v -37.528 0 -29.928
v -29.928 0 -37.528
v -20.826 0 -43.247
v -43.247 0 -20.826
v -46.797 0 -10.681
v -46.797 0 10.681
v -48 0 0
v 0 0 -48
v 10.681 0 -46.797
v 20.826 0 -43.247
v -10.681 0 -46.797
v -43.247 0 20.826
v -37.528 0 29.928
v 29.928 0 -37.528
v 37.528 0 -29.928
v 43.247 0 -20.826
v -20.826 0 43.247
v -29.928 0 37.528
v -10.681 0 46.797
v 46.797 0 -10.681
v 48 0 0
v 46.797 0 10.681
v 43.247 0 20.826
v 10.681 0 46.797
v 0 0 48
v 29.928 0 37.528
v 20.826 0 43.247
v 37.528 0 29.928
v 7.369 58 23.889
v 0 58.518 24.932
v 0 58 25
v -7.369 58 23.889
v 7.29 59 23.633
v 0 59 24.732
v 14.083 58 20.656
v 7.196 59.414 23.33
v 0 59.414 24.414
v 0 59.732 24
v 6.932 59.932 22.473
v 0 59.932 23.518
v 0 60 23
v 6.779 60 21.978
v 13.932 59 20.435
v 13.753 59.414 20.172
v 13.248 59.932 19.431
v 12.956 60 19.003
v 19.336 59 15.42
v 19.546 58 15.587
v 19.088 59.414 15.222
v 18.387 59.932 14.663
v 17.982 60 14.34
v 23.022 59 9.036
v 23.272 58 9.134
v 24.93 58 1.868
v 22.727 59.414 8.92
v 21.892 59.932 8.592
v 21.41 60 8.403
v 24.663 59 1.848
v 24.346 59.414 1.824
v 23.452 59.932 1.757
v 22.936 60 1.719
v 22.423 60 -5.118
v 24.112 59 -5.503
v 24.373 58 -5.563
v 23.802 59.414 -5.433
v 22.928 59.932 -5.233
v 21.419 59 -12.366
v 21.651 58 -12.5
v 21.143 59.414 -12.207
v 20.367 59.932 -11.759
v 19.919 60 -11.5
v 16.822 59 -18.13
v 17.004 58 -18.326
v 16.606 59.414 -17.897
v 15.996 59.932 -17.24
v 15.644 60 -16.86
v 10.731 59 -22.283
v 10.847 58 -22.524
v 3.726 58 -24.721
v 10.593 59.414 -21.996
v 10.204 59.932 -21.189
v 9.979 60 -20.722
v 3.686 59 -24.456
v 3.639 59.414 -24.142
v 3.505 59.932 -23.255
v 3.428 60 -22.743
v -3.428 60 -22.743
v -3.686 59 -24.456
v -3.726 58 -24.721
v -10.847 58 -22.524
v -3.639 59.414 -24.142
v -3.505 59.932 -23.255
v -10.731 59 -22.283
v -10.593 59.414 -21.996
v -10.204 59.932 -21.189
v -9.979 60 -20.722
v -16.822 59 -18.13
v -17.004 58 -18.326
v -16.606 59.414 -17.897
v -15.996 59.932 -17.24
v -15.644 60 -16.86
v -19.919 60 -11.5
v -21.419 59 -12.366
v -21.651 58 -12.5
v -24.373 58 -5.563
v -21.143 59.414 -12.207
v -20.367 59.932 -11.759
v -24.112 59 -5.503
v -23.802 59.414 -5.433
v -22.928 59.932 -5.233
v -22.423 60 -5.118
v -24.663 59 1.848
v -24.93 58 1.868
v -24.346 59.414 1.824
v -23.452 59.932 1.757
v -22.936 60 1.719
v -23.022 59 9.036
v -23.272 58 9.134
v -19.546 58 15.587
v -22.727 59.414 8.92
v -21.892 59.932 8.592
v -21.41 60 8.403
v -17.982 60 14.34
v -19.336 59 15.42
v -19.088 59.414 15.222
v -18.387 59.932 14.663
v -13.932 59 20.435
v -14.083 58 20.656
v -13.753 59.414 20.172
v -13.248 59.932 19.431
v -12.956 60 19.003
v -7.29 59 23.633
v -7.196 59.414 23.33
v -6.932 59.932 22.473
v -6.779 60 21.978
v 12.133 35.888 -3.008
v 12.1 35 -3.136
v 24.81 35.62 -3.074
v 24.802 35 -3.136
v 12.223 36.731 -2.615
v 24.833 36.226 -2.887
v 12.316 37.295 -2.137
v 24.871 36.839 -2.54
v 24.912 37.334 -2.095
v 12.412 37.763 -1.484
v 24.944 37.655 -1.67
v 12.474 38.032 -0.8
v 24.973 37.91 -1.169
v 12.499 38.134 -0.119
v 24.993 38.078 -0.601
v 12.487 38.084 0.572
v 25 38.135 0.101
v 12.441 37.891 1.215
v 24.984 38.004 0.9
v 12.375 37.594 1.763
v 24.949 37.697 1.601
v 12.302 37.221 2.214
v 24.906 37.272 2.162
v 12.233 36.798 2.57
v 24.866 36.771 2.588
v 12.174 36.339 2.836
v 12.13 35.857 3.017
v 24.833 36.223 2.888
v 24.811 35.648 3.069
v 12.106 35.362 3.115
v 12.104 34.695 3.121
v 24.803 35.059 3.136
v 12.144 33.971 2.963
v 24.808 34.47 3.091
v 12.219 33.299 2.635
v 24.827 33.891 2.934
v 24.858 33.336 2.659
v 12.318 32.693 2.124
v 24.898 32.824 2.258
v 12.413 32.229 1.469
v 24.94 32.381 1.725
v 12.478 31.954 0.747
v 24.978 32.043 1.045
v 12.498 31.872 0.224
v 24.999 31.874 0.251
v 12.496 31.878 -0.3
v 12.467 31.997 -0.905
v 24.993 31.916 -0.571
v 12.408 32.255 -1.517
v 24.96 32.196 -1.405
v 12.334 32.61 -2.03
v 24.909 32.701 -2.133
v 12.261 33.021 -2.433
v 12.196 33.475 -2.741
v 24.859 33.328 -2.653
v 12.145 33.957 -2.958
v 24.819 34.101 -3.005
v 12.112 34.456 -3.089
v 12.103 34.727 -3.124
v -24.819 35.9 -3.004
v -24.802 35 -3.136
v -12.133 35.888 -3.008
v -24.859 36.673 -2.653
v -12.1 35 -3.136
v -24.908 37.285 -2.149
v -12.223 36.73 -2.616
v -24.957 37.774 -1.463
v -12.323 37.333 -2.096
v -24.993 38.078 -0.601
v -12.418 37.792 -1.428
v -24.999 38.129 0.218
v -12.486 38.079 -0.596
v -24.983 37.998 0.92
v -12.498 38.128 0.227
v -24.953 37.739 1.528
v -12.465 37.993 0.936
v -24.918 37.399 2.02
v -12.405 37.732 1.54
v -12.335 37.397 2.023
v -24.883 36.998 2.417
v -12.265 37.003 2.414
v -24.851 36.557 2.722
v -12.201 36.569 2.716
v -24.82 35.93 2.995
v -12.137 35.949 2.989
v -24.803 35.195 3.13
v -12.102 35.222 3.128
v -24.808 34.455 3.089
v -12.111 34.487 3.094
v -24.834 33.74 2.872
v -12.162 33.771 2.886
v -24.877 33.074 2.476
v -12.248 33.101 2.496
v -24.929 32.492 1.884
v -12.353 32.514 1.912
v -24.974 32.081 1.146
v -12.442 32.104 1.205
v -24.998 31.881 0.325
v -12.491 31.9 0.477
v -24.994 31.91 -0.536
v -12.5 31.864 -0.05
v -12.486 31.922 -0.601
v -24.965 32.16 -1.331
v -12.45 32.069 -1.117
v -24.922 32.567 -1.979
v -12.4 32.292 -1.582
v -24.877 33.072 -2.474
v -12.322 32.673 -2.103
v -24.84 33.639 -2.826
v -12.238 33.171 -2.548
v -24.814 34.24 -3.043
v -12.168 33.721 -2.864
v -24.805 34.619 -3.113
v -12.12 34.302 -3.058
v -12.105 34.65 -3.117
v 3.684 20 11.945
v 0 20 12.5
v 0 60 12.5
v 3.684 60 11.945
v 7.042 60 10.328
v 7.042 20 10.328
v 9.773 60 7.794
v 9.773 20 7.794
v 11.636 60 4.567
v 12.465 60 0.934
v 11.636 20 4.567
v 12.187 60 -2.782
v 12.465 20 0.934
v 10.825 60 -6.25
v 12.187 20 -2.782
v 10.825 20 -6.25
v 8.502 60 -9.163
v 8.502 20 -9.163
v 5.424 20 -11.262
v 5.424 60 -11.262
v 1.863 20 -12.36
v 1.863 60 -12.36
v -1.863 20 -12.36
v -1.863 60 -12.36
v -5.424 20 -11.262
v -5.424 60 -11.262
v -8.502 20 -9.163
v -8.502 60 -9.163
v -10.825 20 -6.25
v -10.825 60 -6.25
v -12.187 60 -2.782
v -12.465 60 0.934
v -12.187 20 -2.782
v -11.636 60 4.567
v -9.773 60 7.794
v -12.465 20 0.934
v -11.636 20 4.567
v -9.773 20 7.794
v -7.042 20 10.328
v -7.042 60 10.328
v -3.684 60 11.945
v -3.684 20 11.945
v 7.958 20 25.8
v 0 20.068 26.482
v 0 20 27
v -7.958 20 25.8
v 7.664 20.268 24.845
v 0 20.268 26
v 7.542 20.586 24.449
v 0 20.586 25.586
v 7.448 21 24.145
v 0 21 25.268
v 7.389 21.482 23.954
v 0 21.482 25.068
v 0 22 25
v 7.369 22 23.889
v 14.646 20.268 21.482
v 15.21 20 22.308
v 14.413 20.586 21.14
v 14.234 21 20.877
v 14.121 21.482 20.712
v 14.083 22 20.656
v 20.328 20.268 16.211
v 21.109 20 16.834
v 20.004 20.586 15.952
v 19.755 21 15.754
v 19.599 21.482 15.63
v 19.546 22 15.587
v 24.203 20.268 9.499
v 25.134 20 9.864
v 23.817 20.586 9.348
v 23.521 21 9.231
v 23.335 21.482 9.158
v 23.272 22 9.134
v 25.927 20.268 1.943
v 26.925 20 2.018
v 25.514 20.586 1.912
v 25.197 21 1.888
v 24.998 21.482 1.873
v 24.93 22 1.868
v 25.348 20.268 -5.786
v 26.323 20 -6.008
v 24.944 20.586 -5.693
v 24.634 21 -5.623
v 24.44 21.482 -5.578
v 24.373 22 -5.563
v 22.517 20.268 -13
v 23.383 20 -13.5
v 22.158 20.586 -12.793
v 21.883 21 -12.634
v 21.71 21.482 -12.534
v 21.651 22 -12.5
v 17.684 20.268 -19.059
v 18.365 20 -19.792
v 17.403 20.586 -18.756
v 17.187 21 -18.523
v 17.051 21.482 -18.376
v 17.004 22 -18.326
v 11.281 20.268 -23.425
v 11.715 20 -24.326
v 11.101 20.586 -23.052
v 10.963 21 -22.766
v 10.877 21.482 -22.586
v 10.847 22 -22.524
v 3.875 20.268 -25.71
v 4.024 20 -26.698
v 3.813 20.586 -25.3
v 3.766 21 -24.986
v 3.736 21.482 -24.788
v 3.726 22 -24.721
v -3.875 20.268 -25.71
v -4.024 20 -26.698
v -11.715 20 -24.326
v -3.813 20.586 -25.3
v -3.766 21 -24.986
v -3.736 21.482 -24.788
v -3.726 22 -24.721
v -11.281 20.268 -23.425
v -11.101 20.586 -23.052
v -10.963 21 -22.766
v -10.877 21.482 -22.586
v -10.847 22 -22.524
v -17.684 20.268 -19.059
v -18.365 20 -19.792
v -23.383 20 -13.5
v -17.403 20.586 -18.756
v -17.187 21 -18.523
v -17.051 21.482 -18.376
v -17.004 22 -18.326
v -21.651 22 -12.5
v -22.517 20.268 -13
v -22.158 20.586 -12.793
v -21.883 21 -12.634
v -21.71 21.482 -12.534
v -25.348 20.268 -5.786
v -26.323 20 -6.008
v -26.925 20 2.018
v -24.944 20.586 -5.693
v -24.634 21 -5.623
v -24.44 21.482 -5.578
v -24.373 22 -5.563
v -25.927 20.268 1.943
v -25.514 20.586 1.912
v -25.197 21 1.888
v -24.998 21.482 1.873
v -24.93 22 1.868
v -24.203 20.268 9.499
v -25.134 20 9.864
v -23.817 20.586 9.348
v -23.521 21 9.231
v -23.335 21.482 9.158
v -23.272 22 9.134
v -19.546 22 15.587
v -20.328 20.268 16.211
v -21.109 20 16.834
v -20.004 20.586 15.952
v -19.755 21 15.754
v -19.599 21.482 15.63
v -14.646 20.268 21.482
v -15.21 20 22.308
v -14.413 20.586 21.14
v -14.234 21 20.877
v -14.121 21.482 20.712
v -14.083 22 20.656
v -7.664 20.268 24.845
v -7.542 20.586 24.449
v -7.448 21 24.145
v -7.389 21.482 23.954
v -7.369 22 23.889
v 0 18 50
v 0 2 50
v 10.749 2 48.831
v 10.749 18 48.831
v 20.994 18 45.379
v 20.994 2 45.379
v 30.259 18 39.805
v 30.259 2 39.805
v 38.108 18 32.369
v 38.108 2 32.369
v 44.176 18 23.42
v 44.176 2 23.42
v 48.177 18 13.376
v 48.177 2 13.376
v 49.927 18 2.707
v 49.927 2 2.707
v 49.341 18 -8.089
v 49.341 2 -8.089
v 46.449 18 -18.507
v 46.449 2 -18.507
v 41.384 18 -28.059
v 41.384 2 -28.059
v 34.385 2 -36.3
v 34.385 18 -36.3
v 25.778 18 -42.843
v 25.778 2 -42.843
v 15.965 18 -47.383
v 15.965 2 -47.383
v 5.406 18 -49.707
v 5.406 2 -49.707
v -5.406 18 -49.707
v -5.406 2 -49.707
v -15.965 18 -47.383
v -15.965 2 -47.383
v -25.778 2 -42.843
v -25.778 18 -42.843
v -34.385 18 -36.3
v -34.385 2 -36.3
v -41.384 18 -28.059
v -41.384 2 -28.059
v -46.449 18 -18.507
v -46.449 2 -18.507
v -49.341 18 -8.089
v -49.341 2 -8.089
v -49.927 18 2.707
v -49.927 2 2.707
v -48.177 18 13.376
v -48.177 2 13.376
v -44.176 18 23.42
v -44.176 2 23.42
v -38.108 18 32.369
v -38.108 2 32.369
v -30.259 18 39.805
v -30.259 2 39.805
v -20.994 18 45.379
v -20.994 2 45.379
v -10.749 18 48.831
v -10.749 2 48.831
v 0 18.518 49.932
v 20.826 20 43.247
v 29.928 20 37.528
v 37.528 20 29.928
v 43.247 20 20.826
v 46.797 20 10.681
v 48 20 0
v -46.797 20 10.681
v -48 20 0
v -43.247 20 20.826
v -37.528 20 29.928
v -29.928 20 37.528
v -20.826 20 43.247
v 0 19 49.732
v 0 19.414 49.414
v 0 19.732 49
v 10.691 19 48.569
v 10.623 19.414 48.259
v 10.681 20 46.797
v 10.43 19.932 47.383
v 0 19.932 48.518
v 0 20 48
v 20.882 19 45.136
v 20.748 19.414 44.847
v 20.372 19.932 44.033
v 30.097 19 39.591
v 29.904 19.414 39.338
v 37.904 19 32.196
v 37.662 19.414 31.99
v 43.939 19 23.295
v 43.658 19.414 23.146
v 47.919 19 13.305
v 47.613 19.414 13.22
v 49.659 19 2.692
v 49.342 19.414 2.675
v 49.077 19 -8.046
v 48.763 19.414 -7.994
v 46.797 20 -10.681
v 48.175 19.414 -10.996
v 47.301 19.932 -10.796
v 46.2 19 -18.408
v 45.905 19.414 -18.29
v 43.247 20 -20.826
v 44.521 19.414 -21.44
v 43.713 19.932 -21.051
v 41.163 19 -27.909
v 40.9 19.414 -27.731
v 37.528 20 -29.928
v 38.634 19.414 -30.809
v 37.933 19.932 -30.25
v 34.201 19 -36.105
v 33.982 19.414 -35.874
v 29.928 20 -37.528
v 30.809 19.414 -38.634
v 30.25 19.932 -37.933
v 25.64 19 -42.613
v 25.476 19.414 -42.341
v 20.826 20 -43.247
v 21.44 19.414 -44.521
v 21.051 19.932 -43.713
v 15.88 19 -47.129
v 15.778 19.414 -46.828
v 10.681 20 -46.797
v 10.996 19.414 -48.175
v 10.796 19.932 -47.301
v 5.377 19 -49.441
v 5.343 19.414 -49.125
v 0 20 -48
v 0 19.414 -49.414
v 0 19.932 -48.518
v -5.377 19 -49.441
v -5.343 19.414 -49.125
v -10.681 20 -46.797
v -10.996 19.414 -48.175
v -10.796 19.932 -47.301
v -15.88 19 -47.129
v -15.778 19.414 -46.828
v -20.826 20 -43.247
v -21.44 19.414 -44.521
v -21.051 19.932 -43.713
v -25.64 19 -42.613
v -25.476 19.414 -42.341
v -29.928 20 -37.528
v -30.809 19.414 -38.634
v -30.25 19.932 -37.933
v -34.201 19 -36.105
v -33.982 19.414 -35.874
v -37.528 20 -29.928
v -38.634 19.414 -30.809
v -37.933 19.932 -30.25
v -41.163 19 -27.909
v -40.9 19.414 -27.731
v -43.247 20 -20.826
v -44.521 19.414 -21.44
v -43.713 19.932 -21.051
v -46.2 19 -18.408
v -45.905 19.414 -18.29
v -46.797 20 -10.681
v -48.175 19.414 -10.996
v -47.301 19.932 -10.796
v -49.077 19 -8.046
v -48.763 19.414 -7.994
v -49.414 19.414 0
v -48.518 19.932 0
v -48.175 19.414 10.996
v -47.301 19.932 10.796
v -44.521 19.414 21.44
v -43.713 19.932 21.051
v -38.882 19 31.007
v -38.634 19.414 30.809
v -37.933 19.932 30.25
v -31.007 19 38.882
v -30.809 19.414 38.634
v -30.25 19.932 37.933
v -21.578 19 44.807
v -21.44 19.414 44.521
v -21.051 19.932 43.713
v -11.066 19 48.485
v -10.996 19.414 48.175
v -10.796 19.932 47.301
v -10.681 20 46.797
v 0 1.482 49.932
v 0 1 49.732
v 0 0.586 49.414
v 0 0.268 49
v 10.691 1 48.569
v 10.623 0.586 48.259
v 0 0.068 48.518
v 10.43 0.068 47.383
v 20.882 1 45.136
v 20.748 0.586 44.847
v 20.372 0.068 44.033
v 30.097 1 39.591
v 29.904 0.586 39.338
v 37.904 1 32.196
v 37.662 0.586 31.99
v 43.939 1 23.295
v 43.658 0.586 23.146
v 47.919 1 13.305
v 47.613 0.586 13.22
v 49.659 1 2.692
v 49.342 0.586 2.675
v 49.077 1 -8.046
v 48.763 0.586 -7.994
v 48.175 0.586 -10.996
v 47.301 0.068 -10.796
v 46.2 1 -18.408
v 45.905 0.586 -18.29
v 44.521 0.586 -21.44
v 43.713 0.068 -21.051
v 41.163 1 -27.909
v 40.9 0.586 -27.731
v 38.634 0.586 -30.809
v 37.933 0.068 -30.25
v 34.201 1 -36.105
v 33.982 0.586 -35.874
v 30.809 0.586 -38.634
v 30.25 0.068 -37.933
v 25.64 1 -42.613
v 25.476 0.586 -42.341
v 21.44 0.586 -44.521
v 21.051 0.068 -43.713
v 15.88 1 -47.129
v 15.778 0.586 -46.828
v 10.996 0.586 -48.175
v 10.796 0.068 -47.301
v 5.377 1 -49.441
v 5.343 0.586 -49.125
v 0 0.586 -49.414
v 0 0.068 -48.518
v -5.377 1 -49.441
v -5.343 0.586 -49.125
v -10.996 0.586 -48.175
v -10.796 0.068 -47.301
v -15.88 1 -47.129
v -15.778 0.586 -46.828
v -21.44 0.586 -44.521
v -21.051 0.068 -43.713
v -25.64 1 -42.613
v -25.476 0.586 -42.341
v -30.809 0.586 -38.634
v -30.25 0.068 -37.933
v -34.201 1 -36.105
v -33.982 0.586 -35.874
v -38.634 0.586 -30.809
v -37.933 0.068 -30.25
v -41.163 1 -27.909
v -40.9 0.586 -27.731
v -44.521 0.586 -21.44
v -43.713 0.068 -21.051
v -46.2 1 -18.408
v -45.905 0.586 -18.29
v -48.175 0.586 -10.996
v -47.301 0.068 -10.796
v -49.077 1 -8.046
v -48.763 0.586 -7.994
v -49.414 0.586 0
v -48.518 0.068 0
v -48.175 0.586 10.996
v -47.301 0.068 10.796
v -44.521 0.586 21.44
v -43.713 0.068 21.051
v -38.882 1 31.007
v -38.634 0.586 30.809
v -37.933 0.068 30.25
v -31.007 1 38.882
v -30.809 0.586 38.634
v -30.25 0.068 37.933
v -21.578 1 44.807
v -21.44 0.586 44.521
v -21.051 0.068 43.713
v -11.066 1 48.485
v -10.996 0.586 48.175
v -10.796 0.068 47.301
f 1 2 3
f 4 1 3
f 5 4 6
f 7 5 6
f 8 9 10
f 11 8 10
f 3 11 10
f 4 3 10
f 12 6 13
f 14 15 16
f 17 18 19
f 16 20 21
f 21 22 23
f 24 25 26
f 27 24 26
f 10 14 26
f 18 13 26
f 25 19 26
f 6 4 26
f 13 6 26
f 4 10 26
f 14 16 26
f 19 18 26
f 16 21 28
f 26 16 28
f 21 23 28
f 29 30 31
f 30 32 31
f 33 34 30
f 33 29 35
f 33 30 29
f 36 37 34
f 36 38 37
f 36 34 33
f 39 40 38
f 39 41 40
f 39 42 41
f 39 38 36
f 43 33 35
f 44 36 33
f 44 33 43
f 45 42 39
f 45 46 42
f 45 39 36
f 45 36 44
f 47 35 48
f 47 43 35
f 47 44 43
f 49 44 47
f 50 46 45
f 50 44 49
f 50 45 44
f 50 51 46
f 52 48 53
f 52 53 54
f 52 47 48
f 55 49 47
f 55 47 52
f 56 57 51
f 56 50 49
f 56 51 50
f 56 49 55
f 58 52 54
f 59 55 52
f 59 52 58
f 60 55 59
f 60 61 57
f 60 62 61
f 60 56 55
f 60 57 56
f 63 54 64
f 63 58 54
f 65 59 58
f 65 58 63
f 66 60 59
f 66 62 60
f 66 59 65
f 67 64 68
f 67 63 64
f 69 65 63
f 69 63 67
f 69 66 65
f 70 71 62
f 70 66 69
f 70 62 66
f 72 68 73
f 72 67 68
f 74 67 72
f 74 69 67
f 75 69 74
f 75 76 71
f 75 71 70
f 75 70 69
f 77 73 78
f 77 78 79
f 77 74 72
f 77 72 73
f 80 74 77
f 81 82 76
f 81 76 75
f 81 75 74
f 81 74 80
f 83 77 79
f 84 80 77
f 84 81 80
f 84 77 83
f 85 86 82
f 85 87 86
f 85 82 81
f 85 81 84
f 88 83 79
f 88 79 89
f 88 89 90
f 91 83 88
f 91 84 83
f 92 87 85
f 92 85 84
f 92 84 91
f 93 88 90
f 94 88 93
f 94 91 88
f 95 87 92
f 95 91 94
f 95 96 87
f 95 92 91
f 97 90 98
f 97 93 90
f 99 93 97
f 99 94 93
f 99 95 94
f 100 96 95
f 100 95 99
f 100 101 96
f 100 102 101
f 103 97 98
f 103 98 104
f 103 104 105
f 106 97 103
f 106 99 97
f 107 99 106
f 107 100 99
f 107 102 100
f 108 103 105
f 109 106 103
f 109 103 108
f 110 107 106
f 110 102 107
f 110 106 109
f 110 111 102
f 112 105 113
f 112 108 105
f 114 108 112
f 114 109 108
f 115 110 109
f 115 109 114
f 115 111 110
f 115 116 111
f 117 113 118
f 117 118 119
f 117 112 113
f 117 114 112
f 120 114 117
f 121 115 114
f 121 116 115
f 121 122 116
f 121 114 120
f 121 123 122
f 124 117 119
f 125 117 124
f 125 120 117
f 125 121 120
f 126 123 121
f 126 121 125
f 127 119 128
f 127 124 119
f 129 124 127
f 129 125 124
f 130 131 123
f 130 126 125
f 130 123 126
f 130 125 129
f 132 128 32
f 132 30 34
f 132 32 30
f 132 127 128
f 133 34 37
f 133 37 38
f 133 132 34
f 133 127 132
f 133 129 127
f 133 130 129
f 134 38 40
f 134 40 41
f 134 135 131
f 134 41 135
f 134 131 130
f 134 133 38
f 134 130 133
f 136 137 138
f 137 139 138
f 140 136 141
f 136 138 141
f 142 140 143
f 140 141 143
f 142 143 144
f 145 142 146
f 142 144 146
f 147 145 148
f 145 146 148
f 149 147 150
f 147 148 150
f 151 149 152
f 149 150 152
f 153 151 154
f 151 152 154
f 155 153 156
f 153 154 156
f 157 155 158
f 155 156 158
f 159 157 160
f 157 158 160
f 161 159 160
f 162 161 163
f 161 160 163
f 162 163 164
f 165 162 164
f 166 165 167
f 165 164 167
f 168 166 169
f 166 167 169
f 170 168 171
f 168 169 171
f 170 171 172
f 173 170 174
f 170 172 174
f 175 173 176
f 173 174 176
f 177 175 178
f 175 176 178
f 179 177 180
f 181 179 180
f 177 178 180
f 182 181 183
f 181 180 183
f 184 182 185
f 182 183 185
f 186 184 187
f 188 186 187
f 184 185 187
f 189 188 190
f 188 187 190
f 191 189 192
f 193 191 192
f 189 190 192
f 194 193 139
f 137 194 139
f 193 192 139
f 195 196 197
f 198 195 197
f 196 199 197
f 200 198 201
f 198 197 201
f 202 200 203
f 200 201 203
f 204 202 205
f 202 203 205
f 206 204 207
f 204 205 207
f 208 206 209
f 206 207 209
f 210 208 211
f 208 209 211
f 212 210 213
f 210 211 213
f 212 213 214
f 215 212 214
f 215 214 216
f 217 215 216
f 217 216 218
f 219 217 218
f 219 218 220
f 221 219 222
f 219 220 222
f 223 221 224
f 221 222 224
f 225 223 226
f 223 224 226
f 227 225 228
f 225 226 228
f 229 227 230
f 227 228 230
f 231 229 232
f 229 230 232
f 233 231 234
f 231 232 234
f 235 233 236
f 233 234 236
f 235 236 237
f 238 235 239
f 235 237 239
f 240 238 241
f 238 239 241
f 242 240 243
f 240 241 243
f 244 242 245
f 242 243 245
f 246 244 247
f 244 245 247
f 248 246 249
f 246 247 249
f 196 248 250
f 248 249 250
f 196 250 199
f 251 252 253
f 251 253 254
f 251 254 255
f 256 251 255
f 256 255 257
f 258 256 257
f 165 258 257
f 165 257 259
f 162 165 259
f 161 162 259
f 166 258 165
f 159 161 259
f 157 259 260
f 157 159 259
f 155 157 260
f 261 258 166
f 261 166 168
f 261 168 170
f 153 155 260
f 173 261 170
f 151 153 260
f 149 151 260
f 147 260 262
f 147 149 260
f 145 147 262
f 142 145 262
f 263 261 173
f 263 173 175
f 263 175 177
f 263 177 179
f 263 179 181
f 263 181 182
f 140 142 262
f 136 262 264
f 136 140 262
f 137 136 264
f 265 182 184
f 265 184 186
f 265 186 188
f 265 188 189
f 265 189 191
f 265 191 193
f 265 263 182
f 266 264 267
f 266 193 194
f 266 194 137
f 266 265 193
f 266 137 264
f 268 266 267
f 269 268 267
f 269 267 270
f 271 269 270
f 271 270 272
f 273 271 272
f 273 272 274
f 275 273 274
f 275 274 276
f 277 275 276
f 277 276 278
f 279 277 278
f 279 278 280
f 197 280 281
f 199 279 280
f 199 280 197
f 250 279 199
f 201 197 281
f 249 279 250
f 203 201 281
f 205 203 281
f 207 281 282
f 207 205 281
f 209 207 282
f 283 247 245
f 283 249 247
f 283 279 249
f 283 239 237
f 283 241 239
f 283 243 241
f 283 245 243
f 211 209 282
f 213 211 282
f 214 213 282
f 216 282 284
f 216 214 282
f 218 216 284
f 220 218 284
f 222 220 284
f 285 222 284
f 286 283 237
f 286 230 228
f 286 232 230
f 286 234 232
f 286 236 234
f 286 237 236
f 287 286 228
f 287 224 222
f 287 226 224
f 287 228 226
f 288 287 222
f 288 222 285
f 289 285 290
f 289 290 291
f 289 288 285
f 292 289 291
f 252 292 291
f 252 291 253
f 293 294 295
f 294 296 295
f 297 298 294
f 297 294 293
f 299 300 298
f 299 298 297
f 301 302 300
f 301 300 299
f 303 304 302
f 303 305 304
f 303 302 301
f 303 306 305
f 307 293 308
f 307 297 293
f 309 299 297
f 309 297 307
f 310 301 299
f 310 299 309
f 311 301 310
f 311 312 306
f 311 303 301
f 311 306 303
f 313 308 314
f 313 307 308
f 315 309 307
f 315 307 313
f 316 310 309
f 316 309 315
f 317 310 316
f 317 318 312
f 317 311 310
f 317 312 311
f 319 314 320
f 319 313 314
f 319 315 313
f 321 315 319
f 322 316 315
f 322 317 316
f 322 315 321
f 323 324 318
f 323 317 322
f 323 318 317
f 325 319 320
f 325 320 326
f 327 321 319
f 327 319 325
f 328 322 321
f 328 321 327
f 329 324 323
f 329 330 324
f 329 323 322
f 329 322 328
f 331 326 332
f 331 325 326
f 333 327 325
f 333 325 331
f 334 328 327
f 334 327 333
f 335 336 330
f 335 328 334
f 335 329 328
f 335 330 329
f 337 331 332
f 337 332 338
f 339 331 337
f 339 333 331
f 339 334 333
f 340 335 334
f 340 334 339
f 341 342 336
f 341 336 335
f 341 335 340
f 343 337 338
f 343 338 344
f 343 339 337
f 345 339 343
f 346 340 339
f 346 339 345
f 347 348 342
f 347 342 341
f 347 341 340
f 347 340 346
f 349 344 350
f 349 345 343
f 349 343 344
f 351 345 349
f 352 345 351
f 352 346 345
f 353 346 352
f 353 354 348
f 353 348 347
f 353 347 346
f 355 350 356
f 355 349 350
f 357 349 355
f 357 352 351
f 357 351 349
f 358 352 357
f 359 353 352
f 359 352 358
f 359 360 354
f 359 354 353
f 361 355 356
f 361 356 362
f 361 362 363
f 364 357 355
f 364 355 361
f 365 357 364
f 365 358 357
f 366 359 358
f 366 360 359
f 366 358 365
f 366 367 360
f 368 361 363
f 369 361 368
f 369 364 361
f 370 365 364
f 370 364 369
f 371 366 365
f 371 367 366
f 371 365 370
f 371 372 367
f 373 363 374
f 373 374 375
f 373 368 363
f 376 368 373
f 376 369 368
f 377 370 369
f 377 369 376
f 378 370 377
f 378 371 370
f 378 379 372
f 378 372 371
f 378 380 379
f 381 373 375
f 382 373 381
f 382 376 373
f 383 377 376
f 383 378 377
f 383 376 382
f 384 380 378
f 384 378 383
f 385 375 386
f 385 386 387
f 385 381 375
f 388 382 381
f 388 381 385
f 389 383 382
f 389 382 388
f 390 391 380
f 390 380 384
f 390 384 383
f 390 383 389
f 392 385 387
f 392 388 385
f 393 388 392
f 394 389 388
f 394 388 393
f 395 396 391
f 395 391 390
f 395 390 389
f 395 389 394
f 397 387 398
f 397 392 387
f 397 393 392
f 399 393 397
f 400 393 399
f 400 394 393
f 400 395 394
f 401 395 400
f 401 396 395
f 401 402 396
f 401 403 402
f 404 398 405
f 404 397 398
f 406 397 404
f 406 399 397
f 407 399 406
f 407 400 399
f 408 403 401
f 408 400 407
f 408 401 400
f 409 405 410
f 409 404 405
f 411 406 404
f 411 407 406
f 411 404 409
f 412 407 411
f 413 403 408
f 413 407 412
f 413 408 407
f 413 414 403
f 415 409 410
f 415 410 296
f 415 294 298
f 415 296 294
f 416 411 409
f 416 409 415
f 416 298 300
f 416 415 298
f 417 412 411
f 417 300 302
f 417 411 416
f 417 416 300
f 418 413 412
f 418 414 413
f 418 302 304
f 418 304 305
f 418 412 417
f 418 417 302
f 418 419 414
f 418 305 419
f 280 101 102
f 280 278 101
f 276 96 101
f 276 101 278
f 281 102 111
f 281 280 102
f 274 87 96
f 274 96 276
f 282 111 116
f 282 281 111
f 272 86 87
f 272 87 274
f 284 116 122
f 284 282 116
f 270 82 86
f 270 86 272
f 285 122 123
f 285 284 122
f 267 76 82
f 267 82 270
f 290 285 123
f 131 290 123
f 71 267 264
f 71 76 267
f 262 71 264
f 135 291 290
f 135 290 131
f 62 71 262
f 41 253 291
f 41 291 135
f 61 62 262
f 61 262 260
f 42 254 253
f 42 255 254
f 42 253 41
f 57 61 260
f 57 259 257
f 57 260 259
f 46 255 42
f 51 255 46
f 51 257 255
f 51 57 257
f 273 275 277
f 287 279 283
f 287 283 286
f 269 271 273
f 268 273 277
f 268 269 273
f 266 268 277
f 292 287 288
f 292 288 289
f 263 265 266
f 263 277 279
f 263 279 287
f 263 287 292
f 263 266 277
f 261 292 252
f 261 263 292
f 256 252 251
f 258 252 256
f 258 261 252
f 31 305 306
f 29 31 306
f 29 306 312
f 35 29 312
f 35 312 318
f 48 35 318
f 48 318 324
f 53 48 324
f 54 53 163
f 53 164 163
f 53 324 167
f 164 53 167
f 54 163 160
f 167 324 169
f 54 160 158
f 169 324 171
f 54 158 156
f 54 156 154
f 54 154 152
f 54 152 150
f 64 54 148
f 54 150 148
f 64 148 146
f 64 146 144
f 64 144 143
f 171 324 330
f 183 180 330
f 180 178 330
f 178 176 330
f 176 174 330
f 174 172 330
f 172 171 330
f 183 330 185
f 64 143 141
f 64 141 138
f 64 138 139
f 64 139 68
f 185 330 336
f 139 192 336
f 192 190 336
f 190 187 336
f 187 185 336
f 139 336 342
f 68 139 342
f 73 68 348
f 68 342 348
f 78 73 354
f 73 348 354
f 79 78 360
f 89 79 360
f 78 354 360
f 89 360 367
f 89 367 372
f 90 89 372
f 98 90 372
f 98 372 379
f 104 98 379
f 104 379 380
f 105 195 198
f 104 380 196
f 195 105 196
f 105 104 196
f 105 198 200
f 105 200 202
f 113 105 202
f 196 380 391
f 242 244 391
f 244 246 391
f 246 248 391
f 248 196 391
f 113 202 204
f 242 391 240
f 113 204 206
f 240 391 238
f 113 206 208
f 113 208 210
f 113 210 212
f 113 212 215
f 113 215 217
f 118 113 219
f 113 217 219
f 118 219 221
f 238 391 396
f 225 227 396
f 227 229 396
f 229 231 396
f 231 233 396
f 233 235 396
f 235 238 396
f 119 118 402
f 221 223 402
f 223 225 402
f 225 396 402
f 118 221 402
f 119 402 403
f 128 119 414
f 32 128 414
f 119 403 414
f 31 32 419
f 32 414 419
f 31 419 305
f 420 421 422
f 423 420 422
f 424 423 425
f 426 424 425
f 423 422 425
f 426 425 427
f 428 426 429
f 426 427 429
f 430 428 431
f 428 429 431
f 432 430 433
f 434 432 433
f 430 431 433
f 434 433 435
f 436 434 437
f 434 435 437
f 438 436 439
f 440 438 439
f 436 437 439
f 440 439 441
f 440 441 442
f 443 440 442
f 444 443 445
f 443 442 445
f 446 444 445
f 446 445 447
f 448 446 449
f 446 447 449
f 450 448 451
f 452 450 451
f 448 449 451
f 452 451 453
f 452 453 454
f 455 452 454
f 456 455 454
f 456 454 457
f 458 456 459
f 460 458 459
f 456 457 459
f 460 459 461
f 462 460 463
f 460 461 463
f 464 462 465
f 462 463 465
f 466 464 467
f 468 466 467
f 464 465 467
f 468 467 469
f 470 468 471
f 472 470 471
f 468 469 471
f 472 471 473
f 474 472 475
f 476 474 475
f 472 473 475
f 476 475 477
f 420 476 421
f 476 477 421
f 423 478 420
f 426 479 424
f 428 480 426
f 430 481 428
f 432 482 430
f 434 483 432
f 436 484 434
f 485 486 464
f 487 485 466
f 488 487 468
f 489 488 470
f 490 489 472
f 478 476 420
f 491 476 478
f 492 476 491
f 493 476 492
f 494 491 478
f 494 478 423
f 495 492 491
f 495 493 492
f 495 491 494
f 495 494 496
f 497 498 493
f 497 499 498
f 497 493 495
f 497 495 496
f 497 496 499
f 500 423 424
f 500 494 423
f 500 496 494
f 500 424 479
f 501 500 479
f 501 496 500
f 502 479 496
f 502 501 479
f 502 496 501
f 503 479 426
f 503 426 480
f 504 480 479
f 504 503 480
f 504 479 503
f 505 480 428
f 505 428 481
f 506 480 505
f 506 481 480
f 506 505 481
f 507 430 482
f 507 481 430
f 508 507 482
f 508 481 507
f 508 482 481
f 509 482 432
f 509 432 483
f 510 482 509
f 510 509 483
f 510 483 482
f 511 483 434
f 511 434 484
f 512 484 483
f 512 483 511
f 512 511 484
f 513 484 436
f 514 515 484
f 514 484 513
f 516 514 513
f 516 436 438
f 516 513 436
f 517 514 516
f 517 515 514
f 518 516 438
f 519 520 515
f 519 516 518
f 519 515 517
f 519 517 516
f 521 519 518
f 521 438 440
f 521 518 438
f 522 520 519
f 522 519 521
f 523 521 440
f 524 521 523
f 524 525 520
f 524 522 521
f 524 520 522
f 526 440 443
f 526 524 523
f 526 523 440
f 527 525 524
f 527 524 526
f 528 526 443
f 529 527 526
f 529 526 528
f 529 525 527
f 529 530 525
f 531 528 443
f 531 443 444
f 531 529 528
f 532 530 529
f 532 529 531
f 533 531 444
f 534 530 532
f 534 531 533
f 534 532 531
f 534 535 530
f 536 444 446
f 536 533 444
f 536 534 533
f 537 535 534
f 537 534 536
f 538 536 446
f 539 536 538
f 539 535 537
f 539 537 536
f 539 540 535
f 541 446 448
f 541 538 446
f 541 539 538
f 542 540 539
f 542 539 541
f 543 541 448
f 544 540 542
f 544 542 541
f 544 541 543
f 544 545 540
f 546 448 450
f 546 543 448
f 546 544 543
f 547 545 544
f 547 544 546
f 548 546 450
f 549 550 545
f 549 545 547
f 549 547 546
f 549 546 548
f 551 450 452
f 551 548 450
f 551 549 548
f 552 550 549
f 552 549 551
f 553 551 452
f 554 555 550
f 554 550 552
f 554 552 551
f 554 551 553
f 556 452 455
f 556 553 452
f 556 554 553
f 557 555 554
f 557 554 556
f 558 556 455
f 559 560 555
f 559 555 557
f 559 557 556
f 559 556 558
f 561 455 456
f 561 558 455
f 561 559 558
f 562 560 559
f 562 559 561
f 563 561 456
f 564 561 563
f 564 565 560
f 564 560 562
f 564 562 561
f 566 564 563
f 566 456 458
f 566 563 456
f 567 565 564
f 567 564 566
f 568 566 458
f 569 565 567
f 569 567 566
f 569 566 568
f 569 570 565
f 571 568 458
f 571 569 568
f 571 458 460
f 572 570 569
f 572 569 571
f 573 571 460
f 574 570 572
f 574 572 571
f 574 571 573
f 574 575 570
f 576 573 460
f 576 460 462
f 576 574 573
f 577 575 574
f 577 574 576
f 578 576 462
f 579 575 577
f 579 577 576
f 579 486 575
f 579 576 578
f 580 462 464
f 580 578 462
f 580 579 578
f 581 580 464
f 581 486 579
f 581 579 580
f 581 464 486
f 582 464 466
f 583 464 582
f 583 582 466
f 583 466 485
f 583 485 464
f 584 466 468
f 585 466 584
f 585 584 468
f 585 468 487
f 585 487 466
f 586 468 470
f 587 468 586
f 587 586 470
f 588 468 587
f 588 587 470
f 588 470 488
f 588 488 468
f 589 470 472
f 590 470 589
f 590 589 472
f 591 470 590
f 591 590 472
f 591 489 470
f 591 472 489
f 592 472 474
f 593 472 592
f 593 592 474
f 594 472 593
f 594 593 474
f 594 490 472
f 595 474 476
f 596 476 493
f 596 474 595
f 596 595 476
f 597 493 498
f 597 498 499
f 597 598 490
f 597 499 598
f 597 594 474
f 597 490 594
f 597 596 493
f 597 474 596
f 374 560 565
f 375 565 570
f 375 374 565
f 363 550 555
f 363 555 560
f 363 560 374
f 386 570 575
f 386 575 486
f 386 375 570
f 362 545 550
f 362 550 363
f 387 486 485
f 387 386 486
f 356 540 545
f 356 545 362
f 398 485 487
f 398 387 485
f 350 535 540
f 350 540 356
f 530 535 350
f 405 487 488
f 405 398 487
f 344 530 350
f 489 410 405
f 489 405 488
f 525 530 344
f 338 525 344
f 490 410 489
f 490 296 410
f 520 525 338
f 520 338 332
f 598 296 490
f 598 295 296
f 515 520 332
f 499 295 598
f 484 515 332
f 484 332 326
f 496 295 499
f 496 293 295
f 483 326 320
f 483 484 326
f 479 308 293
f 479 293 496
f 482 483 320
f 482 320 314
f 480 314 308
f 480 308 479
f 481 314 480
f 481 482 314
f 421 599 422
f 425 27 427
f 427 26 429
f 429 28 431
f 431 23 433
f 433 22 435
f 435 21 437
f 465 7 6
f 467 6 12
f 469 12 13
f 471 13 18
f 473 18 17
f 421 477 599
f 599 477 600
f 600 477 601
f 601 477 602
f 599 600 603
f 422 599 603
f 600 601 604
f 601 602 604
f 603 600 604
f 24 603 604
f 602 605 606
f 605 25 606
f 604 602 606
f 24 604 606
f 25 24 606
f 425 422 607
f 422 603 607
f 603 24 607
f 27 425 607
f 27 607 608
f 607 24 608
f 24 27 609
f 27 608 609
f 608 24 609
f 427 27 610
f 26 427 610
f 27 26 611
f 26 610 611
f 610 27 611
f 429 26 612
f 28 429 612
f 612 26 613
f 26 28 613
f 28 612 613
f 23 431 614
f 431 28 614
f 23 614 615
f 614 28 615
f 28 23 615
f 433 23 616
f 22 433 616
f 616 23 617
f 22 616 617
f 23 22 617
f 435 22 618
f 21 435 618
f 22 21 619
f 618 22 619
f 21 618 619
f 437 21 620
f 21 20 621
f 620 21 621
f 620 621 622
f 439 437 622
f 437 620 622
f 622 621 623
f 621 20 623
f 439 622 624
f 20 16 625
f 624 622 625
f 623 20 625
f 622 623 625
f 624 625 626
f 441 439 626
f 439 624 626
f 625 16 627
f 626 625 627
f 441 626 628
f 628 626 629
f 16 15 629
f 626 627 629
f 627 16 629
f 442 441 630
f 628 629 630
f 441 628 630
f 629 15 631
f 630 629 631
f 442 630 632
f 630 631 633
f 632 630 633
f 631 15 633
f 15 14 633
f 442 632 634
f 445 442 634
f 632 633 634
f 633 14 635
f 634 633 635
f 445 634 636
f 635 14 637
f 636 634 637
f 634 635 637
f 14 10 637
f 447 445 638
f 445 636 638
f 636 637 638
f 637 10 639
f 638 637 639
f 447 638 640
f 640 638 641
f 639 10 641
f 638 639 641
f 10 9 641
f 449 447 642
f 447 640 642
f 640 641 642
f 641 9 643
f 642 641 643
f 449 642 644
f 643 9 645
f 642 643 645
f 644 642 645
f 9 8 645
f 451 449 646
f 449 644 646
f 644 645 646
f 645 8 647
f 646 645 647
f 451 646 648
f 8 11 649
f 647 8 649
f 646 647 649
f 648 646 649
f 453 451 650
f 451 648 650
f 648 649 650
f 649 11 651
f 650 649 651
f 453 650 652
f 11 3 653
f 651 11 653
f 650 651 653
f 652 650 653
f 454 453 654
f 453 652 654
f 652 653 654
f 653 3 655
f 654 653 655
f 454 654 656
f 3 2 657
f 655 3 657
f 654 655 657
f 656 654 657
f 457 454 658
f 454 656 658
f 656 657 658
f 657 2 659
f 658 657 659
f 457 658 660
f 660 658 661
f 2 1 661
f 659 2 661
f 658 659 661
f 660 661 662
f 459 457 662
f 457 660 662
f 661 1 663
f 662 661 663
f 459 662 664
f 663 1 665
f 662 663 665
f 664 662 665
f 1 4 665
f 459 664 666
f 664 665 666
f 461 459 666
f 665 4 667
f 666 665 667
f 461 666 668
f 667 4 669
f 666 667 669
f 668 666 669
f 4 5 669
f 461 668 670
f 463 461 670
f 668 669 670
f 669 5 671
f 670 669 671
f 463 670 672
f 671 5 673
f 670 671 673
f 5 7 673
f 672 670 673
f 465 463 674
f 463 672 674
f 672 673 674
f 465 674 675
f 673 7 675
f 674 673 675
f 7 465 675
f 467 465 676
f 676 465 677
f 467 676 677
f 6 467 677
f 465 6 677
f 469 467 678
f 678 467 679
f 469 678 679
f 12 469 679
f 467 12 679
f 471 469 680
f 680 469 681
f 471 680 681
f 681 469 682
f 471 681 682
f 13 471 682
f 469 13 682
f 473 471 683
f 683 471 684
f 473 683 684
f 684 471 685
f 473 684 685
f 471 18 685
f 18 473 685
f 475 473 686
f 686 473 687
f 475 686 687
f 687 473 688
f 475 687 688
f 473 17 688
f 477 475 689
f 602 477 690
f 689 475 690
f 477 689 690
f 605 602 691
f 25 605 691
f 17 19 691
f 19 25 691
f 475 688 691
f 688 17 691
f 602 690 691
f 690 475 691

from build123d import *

# Parameters (mm, degrees)
SKETCH1_R           = 50
BOSS_EXTRUDE1_DEPTH = 20
SKETCH2_R           = 25
SKETCH2_R_2         = 12.5
BOSS_EXTRUDE2_DEPTH = 40
FILLET1_R           = 2
FILLET2_R           = 2
SKETCH3_R           = 3.136270049
CUT_EXTRUDE1_DEPTH  = 25


with BuildPart() as part:
    # Sketch1 → Boss-Extrude1 (new body)
    with BuildSketch(Plane(origin=(0, 0, 0), x_dir=(1, 0, 0), z_dir=(0, 1, 0))):
        with Locations(Location((0, 0, 0), (0, 0, 270))):
            Circle(SKETCH1_R)
    extrude(amount=BOSS_EXTRUDE1_DEPTH)

    # Sketch2 → Boss-Extrude2 (add)
    with BuildSketch(Plane(origin=(0, 20, 0), x_dir=(1, 0, 0), z_dir=(0, 1, 0))):
        with Locations(Location((0, 0, 0), (0, 0, 270))):
            Circle(SKETCH2_R)
        with Locations(Location((0, 0, 0), (0, 0, 270))):
            Circle(SKETCH2_R_2, mode=Mode.SUBTRACT)
    extrude(amount=BOSS_EXTRUDE2_DEPTH)

    # Fillet1
    fillet1_edges = [part.edges().sort_by_distance(p)[0] for p in [
        (0, 0, -50),
    ]]
    fillet(fillet1_edges, radius=FILLET1_R)

    # Fillet2
    fillet2_edges = [part.edges().sort_by_distance(p)[0] for p in [
        (0, 20, -50),
        (0, 60, -25),
        (0, 20, -25),
    ]]
    fillet(fillet2_edges, radius=FILLET2_R)

    # Sketch3 → Cut-Extrude1 (cut, symmetric)
    with BuildSketch(Plane(origin=(0, 0, 0), x_dir=(0, 0, -1), z_dir=(1, 0, 0))):
        with Locations((0, 35)):
            Circle(SKETCH3_R)
    extrude(amount=CUT_EXTRUDE1_DEPTH, both=True, mode=Mode.SUBTRACT)


solid = part.part
